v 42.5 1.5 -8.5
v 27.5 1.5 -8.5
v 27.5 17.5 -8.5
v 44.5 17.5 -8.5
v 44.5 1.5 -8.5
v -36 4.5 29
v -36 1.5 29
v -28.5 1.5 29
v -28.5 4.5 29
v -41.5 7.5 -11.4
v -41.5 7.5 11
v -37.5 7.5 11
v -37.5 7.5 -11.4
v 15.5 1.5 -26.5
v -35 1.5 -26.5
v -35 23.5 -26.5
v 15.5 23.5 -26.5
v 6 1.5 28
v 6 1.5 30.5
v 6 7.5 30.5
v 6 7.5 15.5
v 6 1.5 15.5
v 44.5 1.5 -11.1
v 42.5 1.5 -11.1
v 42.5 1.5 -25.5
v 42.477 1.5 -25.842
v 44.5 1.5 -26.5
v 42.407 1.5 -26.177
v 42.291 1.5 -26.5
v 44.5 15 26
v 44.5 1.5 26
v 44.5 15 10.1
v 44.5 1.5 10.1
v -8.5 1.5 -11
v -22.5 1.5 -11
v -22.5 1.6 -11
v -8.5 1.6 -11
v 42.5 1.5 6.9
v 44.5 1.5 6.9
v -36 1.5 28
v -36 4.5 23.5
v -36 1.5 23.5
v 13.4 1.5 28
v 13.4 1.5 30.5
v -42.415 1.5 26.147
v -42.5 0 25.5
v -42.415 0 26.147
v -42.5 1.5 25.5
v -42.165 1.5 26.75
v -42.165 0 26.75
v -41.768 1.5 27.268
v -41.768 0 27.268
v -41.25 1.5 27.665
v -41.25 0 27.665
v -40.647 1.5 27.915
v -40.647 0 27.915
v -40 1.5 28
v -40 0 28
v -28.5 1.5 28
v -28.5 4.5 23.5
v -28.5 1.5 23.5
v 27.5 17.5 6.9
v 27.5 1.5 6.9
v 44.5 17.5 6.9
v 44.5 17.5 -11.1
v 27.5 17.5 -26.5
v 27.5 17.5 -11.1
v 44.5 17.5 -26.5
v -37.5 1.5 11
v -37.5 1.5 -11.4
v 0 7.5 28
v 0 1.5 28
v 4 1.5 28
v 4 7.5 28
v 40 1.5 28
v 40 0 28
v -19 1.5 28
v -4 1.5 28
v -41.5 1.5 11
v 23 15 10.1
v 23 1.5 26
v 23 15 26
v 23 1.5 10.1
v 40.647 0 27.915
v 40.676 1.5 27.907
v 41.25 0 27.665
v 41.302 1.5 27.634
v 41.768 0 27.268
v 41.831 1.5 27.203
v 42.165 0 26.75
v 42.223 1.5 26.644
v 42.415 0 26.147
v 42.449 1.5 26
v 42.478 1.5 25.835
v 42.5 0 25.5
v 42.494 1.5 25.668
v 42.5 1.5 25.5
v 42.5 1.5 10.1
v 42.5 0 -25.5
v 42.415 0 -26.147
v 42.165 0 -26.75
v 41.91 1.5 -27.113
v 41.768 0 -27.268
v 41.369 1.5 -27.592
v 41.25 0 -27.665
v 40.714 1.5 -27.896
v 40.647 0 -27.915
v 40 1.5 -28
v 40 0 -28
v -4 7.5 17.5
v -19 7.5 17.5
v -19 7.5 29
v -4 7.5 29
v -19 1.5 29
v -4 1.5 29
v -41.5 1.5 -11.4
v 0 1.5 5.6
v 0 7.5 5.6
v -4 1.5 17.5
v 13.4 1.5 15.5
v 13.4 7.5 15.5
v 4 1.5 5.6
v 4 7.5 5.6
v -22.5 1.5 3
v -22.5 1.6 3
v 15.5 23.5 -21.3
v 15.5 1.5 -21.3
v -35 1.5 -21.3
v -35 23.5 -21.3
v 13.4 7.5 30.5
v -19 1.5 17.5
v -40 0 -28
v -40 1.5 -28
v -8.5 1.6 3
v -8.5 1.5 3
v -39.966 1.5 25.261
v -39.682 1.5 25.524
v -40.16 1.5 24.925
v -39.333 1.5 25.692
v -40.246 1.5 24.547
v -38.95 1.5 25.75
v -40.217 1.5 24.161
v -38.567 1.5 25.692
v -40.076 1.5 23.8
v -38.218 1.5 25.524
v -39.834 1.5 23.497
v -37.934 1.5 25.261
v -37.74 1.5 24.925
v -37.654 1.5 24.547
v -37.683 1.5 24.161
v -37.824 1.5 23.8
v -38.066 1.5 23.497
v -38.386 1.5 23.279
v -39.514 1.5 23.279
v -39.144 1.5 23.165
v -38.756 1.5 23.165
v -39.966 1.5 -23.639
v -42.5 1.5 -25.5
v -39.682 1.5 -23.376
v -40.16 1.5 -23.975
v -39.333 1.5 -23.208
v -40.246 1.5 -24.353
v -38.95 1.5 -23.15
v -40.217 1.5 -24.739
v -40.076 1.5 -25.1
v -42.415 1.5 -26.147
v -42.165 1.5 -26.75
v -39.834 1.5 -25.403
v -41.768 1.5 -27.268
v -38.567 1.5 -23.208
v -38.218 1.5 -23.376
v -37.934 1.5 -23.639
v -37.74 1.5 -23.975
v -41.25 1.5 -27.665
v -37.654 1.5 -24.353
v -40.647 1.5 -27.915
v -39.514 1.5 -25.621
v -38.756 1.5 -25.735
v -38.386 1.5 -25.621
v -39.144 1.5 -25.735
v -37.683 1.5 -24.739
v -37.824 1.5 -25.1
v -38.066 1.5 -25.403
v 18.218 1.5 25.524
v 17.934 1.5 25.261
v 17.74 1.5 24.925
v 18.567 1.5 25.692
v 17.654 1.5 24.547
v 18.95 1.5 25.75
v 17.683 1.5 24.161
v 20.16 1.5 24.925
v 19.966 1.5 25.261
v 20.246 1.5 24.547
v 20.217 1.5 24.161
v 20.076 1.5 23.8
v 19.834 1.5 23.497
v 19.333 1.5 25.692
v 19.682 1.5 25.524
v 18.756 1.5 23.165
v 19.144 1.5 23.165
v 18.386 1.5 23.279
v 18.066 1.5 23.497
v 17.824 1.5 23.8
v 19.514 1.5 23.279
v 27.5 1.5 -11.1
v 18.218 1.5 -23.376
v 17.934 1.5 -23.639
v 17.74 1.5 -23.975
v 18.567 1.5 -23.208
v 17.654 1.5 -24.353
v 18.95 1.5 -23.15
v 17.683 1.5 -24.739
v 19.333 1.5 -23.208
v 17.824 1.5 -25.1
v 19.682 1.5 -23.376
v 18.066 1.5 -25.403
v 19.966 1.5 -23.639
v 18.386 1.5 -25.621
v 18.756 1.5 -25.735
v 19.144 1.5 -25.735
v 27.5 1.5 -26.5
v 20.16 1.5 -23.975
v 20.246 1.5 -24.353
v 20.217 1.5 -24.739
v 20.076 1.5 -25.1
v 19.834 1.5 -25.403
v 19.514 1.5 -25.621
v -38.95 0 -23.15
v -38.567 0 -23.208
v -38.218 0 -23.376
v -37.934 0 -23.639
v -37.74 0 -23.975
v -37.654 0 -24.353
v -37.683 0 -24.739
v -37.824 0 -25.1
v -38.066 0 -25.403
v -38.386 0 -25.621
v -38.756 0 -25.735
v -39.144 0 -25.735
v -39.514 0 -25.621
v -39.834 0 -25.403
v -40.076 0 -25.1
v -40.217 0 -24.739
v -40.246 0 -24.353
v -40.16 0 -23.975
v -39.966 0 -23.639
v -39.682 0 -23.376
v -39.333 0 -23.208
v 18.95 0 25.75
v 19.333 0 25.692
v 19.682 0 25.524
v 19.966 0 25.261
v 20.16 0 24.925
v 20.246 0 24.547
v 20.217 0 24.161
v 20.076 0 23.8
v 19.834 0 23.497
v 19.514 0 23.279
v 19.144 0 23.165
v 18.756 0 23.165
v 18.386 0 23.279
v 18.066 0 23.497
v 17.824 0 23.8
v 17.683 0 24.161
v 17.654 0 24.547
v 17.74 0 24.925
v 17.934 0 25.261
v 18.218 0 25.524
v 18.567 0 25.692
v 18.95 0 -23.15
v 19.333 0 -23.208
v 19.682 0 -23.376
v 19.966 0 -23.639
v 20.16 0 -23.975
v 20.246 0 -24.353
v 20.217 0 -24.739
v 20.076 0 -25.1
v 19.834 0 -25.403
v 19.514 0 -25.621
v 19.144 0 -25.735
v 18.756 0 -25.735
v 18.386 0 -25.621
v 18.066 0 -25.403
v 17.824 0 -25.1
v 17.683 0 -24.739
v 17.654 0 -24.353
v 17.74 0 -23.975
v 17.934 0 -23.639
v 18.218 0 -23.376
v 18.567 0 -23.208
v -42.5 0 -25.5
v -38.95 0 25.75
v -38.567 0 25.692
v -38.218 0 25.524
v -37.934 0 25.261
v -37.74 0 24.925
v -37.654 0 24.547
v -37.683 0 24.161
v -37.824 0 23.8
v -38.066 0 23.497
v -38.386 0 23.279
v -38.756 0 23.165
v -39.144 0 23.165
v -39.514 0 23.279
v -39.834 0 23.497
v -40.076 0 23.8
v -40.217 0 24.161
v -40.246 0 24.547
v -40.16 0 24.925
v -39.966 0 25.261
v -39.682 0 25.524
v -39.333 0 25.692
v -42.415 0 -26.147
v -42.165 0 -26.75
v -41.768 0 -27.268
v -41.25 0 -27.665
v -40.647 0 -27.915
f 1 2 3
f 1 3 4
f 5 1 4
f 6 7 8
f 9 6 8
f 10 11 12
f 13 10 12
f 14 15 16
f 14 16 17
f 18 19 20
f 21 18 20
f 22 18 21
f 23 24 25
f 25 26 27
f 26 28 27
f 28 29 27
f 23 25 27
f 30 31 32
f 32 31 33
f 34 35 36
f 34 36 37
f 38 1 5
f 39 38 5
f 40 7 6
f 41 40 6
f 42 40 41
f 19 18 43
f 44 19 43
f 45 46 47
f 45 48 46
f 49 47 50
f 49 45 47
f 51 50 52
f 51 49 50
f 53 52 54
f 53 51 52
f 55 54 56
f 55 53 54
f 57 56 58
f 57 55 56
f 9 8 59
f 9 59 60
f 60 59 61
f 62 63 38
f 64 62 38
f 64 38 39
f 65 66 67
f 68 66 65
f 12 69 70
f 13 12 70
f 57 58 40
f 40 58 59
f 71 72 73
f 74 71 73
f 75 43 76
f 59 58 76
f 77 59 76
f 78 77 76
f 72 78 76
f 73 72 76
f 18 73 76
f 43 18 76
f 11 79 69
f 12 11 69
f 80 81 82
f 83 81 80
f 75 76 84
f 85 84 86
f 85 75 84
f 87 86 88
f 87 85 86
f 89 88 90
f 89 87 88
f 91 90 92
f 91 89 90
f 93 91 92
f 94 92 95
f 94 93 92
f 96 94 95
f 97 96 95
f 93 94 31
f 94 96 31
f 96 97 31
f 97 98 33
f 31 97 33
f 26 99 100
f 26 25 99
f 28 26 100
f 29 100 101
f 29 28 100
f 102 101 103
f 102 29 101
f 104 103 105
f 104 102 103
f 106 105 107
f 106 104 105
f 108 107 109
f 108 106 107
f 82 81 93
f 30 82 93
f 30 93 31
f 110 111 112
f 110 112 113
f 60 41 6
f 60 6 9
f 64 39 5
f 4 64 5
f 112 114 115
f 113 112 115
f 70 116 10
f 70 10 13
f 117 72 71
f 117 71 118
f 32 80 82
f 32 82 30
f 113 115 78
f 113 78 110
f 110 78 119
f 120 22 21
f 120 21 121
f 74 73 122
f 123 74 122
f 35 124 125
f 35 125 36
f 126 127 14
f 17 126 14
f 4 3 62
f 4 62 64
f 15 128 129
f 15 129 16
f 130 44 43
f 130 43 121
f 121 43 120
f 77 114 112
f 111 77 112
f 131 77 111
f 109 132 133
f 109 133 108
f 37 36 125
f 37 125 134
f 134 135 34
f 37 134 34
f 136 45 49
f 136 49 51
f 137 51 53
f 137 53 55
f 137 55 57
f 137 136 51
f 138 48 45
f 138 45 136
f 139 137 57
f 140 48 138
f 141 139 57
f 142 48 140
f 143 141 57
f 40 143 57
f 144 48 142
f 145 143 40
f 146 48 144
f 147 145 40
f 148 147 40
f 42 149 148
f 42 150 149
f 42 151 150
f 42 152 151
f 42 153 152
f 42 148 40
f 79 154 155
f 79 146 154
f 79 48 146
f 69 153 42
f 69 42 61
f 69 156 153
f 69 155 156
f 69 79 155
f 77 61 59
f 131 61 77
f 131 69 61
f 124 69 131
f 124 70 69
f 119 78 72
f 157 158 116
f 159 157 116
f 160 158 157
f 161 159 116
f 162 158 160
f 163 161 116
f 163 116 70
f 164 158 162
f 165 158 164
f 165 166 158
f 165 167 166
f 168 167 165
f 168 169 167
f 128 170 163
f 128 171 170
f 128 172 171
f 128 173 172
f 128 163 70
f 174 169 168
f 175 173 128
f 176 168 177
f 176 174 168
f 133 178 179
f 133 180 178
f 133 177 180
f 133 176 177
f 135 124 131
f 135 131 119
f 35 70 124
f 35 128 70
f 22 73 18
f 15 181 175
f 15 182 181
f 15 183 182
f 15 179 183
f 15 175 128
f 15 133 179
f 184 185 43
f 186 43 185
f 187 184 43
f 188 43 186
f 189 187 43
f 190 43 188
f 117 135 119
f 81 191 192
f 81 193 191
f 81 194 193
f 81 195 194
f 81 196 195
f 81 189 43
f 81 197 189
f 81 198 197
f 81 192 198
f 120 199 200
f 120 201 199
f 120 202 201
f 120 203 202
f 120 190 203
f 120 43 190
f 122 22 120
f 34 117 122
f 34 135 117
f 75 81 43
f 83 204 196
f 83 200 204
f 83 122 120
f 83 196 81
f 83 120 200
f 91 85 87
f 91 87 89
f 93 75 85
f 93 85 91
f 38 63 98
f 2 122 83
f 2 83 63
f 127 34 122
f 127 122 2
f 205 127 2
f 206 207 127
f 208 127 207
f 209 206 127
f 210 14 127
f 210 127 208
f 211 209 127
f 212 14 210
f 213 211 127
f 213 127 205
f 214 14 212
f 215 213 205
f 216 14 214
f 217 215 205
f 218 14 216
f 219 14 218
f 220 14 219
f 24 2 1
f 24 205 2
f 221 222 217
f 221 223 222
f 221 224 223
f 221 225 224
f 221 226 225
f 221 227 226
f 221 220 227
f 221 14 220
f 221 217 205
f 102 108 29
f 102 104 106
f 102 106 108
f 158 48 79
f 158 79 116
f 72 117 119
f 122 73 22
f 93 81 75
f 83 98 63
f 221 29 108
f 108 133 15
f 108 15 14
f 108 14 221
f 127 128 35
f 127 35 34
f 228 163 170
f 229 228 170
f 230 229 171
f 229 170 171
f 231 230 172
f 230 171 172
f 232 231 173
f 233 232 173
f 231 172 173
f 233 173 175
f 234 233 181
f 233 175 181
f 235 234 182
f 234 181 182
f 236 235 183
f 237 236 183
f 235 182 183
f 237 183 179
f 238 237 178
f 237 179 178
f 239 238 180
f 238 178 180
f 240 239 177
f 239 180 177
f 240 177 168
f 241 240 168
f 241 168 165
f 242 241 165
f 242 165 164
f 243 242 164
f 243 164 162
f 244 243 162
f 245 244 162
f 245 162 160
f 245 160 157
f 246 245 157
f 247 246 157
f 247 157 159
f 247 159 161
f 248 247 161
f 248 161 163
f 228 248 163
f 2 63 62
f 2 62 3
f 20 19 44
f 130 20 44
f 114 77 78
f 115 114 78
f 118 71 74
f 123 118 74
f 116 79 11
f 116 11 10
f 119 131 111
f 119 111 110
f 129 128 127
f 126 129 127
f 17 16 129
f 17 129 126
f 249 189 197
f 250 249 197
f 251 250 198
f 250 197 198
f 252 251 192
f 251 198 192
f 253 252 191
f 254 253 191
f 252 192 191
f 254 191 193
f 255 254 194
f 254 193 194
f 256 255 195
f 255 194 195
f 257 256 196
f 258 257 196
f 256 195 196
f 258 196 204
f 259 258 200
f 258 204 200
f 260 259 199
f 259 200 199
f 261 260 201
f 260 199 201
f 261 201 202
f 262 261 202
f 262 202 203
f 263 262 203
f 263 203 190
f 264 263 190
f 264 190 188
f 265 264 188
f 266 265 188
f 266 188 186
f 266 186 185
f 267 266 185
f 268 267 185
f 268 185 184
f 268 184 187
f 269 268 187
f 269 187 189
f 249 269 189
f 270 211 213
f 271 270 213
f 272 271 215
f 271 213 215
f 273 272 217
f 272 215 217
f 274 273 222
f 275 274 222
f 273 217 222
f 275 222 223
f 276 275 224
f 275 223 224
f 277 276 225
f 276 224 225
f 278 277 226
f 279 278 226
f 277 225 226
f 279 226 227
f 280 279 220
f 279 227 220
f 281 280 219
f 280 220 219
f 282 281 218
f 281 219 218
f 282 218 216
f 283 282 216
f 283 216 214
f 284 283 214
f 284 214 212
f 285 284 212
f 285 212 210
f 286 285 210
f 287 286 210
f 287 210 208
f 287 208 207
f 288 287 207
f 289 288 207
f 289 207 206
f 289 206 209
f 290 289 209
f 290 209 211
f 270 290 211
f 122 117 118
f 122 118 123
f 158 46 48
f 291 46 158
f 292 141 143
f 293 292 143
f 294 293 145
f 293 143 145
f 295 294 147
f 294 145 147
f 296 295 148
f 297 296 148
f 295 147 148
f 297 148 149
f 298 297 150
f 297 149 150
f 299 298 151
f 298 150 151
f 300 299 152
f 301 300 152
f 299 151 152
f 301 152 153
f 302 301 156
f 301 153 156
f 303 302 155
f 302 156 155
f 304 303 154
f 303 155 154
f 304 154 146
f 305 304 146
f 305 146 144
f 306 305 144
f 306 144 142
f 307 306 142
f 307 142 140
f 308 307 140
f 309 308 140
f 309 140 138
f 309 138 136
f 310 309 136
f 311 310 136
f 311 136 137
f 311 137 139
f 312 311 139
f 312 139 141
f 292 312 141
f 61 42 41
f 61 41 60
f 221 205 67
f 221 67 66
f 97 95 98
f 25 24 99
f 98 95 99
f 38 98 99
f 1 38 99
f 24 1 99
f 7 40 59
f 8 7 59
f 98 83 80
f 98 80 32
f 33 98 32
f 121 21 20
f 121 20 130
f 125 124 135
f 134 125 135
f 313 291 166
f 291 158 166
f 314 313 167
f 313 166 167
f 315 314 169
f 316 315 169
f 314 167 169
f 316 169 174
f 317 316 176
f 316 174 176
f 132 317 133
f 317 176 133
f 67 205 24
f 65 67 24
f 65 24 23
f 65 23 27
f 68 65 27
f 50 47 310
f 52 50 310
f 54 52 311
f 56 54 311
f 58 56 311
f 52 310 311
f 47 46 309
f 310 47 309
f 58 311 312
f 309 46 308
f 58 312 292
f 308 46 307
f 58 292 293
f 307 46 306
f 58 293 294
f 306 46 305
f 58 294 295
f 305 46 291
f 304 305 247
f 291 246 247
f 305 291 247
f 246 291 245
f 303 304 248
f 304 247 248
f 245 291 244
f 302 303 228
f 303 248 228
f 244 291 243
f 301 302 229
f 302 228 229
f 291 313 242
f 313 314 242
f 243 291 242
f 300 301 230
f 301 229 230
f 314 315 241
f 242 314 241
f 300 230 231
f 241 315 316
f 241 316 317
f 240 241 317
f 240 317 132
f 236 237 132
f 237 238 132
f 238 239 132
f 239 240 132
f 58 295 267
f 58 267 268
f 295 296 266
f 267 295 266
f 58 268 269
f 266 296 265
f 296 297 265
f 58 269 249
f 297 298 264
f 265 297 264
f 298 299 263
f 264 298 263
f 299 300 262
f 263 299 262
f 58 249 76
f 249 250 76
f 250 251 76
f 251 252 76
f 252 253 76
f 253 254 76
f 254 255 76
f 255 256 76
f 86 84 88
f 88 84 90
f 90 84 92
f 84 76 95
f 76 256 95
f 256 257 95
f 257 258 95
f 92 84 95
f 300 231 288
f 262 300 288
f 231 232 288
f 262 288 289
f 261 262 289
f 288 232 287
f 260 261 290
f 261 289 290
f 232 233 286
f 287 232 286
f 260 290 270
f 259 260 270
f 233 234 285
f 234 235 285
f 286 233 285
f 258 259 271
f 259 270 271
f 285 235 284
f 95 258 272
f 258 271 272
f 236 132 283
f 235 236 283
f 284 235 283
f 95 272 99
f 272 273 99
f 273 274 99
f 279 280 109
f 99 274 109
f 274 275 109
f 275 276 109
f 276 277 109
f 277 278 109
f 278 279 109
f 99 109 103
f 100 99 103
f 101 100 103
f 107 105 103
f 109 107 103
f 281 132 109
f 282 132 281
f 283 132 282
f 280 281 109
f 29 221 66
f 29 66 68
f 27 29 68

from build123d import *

# Parameters (mm, degrees)
SKETCH1_W           = 85
SKETCH1_H           = 56
BOSS_EXTRUDE1_DEPTH = 1.5
FILLET1_R           = 2.5
SKETCH2_R           = 1.3
CUT_EXTRUDE1_DEPTH  = 51.916598472
SKETCH3_W           = 14
SKETCH3_H           = 14
BOSS_EXTRUDE2_DEPTH = 0.1
SKETCH4_W           = 50.5
SKETCH4_H           = 5.2
BOSS_EXTRUDE3_DEPTH = 22
SKETCH5_W           = 7.5
SKETCH5_H           = 5.5
BOSS_EXTRUDE4_DEPTH = 3
SKETCH6_W           = 4
SKETCH6_H           = 22.4
SKETCH6_W_2         = 15
SKETCH6_H_2         = 11.5
SKETCH6_W_3         = 7.4
SKETCH6_H_3         = 15
BOSS_EXTRUDE5_DEPTH = 6
SKETCH7_W           = 21.5
SKETCH7_H           = 15.9
BOSS_EXTRUDE6_DEPTH = 13.5
SKETCH7_3_W         = 17
SKETCH7_3_H         = 15.4
BOSS_EXTRUDE7_DEPTH = 16


with BuildPart() as part:
    # Sketch1 → Boss-Extrude1 (new body)
    with BuildSketch(Plane(origin=(0, 0, 0), x_dir=(1, 0, 0), z_dir=(0, 1, 0))):
        Rectangle(SKETCH1_W, SKETCH1_H)
    extrude(amount=BOSS_EXTRUDE1_DEPTH)

    # Fillet1
    fillet1_edges = [part.edges().sort_by_distance(p)[0] for p in [
        (-42.5, 0.75, 28),
        (-42.5, 0.75, -28),
        (42.5, 0.75, -28),
        (42.5, 0.75, 28),
    ]]
    fillet(fillet1_edges, radius=FILLET1_R)

    # Sketch2 → Cut-Extrude1 (cut, through all)
    with BuildSketch(Plane(origin=(0, 1.5, 0), x_dir=(1, 0, 0), z_dir=(0, 1, 0))):
        with Locations((-38.95, -24.45)):
            Circle(SKETCH2_R)
        with Locations((-38.95, 24.45)):
            Circle(SKETCH2_R)
        with Locations((18.95, 24.45)):
            Circle(SKETCH2_R)
        with Locations((18.95, -24.45)):
            Circle(SKETCH2_R)
    extrude(amount=-CUT_EXTRUDE1_DEPTH, mode=Mode.SUBTRACT)

    # Sketch3 → Boss-Extrude2 (add)
    with BuildSketch(Plane(origin=(0, 1.5, 0), x_dir=(1, 0, 0), z_dir=(0, 1, 0))):
        with Locations((-15.5, 4)):
            Rectangle(SKETCH3_W, SKETCH3_H)
    extrude(amount=BOSS_EXTRUDE2_DEPTH)

    # Sketch4 → Boss-Extrude3 (add)
    with BuildSketch(Plane(origin=(0, 1.5, 0), x_dir=(1, 0, 0), z_dir=(0, 1, 0))):
        with Locations((-9.75, 23.9)):
            Rectangle(SKETCH4_W, SKETCH4_H)
    extrude(amount=BOSS_EXTRUDE3_DEPTH)

    # Sketch5 → Boss-Extrude4 (add)
    with BuildSketch(Plane(origin=(0, 1.5, 0), x_dir=(1, 0, 0), z_dir=(0, 1, 0))):
        with Locations((-32.25, -26.25)):
            Rectangle(SKETCH5_W, SKETCH5_H)
    extrude(amount=BOSS_EXTRUDE4_DEPTH)

    # Sketch6 → Boss-Extrude5 (add)
    with BuildSketch(Plane(origin=(0, 1.5, 0), x_dir=(1, 0, 0), z_dir=(0, 1, 0))):
        with Locations((2, -16.8)):
            Rectangle(SKETCH6_W, SKETCH6_H)
        with Locations((-39.5, 0.2)):
            Rectangle(SKETCH6_W, SKETCH6_H)
        with Locations((-11.5, -23.25)):
            Rectangle(SKETCH6_W_2, SKETCH6_H_2)
        with Locations((9.7, -23)):
            Rectangle(SKETCH6_W_3, SKETCH6_H_3)
    extrude(amount=BOSS_EXTRUDE5_DEPTH)

    # Sketch7 → Boss-Extrude6 (add)
    with BuildSketch(Plane(origin=(0, 1.5, 0), x_dir=(1, 0, 0), z_dir=(0, 1, 0))):
        with Locations((33.75, -18.05)):
            Rectangle(SKETCH7_W, SKETCH7_H)
    extrude(amount=BOSS_EXTRUDE6_DEPTH)

    # Sketch7<3> → Boss-Extrude7 (add)
    with BuildSketch(Plane(origin=(0, 1.5, 0), x_dir=(1, 0, 0), z_dir=(0, 1, 0))):
        with Locations((36, 18.8)):
            Rectangle(SKETCH7_3_W, SKETCH7_3_H)
        with Locations((36, 0.8)):
            Rectangle(SKETCH7_3_W, SKETCH7_3_H)
    extrude(amount=BOSS_EXTRUDE7_DEPTH)


solid = part.part
